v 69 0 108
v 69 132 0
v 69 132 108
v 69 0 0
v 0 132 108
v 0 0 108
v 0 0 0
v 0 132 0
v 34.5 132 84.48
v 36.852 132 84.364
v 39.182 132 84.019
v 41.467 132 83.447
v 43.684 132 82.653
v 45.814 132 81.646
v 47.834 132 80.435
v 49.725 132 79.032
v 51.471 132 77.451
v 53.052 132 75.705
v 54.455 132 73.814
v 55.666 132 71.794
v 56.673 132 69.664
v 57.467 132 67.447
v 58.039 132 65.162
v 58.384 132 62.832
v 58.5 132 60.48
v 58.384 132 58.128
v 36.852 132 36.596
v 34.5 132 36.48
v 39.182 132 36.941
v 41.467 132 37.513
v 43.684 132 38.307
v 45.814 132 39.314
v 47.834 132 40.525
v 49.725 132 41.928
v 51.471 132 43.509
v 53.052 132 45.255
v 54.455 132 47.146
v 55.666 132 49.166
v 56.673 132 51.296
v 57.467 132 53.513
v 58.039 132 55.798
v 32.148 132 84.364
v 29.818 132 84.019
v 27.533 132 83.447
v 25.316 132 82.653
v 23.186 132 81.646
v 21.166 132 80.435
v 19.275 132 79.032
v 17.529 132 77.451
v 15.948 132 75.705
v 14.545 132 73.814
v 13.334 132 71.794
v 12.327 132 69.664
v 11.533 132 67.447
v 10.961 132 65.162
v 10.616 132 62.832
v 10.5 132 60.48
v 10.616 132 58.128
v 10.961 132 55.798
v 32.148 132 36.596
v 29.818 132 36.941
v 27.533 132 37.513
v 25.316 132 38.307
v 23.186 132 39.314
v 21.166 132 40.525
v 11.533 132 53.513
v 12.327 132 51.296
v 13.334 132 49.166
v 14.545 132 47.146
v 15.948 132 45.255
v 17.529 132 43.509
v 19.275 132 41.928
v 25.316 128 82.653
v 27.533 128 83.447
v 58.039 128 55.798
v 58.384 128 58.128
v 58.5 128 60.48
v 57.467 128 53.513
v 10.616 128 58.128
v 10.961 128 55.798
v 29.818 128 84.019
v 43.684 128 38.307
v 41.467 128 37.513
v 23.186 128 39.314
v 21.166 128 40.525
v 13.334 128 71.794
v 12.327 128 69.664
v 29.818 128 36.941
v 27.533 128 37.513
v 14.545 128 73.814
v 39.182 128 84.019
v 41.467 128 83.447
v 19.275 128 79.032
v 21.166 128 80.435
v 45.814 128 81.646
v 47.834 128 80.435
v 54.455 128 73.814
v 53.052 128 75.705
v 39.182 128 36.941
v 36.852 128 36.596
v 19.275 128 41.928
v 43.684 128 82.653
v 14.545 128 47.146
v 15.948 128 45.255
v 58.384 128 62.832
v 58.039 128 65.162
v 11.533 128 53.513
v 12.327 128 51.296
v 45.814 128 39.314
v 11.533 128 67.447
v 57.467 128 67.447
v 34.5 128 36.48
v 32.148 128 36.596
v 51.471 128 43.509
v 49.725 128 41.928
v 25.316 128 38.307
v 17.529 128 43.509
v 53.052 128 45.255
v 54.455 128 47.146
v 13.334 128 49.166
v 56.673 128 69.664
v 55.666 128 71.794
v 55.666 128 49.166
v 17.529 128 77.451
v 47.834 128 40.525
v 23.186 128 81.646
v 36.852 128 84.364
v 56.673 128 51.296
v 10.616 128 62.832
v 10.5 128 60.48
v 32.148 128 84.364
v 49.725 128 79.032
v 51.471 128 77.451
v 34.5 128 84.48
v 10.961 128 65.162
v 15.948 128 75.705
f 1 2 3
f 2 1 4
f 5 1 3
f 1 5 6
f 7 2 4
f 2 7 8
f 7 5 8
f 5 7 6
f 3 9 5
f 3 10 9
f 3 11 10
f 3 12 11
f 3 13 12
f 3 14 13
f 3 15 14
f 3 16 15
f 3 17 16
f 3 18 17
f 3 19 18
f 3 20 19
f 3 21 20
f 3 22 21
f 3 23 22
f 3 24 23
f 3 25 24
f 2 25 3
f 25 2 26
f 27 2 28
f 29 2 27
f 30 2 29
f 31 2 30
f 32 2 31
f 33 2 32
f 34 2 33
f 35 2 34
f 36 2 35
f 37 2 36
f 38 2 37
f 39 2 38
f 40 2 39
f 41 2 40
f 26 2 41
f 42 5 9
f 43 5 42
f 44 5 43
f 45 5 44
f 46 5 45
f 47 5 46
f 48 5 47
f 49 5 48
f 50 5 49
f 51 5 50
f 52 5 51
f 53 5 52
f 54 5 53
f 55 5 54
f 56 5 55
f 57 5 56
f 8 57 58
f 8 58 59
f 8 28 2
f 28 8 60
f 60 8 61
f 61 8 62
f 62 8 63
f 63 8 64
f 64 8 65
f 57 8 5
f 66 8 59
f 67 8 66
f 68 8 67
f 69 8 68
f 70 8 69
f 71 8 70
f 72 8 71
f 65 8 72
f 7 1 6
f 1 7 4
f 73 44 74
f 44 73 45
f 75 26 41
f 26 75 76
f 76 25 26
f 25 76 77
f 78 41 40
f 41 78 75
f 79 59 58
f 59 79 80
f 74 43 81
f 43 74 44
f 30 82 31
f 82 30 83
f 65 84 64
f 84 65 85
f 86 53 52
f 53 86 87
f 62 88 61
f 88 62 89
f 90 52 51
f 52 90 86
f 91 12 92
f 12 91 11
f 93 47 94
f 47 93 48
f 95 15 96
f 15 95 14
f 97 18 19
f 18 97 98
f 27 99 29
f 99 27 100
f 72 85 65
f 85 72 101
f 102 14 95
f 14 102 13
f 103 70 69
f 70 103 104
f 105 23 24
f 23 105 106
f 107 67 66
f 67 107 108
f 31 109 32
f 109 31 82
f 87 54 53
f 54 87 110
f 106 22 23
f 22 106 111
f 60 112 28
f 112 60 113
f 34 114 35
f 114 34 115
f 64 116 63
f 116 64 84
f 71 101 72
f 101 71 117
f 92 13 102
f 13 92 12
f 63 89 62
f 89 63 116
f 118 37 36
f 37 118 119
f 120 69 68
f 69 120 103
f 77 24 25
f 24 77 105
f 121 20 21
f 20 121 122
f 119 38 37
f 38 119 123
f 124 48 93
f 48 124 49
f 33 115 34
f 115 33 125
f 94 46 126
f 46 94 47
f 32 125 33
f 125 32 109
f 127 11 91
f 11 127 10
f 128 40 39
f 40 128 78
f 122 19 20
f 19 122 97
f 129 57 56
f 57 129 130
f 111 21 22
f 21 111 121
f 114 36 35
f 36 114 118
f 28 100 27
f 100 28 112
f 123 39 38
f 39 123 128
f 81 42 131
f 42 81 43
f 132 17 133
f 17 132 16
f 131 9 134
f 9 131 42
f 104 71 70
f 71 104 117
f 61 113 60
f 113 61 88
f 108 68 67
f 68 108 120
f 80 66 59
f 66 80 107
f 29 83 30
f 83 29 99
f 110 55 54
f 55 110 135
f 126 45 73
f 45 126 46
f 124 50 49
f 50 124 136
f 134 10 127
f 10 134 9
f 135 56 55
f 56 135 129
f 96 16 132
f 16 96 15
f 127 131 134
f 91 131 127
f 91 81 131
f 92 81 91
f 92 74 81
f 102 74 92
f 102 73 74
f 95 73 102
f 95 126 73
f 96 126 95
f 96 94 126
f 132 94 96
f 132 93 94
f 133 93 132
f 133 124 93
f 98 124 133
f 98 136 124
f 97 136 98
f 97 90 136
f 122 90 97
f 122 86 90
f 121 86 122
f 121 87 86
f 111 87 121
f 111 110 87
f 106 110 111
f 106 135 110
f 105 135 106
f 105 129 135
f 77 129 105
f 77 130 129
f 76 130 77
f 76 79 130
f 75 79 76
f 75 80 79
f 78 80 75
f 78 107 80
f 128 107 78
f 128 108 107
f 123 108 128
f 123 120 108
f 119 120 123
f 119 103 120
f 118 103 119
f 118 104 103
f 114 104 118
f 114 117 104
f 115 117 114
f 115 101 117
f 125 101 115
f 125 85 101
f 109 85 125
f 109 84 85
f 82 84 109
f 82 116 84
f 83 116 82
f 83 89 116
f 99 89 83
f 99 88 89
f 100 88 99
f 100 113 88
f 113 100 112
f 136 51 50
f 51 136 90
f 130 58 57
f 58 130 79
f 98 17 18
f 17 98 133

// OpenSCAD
// =============================================================================
// FUNLOGY FLSS1 ("FUNLOGY Speaker") — bounding ENVELOPE for Console10 fit-checks.
//
// One unit. This is the MAX bounding volume per the funlogy.jp spec table (which
// already includes the 30 deg tilt), NOT the true enclosure shape — use it for
// clearance / footprint checks beside the Console10 modules.
//   W 69 x D 132 x H 108 mm  |  ~260 g  |  Φ48 driver, passive-radiator bass
//   14 W (7W x2, 3.6 ohm)  |  3.5 mm audio in  |  USB-A 5V power  |  volume dial
//   front (driver) face = +Y ;  sits on the desk at Z=0.
// =============================================================================

sp_w     = 69;     // width  (X, left-right)
sp_d     = 132;    // depth  (Y, front -> back)
sp_h     = 108;    // height (Z, up)
driver_d = 48;     // Φ48 driver
tilt     = 30;     // front-baffle rake (design feature; lives WITHIN the box)
$fn      = 64;

// optional desk fit-check: two speakers flanking one Console10 module
show_pair = false;
console_w = 253;   // one Console10 module (10" mini-rack width)
pair_gap  = 20;    // speaker <-> console gap

echo(str("FUNLOGY FLSS1 envelope (one unit) ", sp_w, " x ", sp_d, " x ", sp_h, " mm = ",
         sp_w/25.4, " x ", sp_d/25.4, " x ", sp_h/25.4, " in | driver Φ", driver_d,
         " | footprint ", sp_w, " x ", sp_d, " mm"));

module funlogy_envelope() {
    color("Gainsboro")
    difference() {
        cube([sp_w, sp_d, sp_h]);                        // bounding box; front = +Y face
        // Φ48 driver indicator on the front face (real baffle rakes ~30 deg up inside the box)
        translate([sp_w/2, sp_d - 1.5, sp_h*0.56])
            rotate([-90, 0, 0]) cylinder(d = driver_d, h = 5, center = true);
    }
}

module desk_layout() {
    funlogy_envelope();                                                      // left speaker
    color("LightSteelBlue")                                                  // console footprint ref
        translate([sp_w + pair_gap, 0, 0]) cube([console_w, sp_d, 1]);
    translate([sp_w + 2*pair_gap + console_w, 0, 0]) funlogy_envelope();     // right speaker
    row = 2*sp_w + 2*pair_gap + console_w;
    echo(str("Speaker + console + speaker row = ", row, " mm (", row/25.4, " in)"));
}

if (show_pair) desk_layout(); else funlogy_envelope();
